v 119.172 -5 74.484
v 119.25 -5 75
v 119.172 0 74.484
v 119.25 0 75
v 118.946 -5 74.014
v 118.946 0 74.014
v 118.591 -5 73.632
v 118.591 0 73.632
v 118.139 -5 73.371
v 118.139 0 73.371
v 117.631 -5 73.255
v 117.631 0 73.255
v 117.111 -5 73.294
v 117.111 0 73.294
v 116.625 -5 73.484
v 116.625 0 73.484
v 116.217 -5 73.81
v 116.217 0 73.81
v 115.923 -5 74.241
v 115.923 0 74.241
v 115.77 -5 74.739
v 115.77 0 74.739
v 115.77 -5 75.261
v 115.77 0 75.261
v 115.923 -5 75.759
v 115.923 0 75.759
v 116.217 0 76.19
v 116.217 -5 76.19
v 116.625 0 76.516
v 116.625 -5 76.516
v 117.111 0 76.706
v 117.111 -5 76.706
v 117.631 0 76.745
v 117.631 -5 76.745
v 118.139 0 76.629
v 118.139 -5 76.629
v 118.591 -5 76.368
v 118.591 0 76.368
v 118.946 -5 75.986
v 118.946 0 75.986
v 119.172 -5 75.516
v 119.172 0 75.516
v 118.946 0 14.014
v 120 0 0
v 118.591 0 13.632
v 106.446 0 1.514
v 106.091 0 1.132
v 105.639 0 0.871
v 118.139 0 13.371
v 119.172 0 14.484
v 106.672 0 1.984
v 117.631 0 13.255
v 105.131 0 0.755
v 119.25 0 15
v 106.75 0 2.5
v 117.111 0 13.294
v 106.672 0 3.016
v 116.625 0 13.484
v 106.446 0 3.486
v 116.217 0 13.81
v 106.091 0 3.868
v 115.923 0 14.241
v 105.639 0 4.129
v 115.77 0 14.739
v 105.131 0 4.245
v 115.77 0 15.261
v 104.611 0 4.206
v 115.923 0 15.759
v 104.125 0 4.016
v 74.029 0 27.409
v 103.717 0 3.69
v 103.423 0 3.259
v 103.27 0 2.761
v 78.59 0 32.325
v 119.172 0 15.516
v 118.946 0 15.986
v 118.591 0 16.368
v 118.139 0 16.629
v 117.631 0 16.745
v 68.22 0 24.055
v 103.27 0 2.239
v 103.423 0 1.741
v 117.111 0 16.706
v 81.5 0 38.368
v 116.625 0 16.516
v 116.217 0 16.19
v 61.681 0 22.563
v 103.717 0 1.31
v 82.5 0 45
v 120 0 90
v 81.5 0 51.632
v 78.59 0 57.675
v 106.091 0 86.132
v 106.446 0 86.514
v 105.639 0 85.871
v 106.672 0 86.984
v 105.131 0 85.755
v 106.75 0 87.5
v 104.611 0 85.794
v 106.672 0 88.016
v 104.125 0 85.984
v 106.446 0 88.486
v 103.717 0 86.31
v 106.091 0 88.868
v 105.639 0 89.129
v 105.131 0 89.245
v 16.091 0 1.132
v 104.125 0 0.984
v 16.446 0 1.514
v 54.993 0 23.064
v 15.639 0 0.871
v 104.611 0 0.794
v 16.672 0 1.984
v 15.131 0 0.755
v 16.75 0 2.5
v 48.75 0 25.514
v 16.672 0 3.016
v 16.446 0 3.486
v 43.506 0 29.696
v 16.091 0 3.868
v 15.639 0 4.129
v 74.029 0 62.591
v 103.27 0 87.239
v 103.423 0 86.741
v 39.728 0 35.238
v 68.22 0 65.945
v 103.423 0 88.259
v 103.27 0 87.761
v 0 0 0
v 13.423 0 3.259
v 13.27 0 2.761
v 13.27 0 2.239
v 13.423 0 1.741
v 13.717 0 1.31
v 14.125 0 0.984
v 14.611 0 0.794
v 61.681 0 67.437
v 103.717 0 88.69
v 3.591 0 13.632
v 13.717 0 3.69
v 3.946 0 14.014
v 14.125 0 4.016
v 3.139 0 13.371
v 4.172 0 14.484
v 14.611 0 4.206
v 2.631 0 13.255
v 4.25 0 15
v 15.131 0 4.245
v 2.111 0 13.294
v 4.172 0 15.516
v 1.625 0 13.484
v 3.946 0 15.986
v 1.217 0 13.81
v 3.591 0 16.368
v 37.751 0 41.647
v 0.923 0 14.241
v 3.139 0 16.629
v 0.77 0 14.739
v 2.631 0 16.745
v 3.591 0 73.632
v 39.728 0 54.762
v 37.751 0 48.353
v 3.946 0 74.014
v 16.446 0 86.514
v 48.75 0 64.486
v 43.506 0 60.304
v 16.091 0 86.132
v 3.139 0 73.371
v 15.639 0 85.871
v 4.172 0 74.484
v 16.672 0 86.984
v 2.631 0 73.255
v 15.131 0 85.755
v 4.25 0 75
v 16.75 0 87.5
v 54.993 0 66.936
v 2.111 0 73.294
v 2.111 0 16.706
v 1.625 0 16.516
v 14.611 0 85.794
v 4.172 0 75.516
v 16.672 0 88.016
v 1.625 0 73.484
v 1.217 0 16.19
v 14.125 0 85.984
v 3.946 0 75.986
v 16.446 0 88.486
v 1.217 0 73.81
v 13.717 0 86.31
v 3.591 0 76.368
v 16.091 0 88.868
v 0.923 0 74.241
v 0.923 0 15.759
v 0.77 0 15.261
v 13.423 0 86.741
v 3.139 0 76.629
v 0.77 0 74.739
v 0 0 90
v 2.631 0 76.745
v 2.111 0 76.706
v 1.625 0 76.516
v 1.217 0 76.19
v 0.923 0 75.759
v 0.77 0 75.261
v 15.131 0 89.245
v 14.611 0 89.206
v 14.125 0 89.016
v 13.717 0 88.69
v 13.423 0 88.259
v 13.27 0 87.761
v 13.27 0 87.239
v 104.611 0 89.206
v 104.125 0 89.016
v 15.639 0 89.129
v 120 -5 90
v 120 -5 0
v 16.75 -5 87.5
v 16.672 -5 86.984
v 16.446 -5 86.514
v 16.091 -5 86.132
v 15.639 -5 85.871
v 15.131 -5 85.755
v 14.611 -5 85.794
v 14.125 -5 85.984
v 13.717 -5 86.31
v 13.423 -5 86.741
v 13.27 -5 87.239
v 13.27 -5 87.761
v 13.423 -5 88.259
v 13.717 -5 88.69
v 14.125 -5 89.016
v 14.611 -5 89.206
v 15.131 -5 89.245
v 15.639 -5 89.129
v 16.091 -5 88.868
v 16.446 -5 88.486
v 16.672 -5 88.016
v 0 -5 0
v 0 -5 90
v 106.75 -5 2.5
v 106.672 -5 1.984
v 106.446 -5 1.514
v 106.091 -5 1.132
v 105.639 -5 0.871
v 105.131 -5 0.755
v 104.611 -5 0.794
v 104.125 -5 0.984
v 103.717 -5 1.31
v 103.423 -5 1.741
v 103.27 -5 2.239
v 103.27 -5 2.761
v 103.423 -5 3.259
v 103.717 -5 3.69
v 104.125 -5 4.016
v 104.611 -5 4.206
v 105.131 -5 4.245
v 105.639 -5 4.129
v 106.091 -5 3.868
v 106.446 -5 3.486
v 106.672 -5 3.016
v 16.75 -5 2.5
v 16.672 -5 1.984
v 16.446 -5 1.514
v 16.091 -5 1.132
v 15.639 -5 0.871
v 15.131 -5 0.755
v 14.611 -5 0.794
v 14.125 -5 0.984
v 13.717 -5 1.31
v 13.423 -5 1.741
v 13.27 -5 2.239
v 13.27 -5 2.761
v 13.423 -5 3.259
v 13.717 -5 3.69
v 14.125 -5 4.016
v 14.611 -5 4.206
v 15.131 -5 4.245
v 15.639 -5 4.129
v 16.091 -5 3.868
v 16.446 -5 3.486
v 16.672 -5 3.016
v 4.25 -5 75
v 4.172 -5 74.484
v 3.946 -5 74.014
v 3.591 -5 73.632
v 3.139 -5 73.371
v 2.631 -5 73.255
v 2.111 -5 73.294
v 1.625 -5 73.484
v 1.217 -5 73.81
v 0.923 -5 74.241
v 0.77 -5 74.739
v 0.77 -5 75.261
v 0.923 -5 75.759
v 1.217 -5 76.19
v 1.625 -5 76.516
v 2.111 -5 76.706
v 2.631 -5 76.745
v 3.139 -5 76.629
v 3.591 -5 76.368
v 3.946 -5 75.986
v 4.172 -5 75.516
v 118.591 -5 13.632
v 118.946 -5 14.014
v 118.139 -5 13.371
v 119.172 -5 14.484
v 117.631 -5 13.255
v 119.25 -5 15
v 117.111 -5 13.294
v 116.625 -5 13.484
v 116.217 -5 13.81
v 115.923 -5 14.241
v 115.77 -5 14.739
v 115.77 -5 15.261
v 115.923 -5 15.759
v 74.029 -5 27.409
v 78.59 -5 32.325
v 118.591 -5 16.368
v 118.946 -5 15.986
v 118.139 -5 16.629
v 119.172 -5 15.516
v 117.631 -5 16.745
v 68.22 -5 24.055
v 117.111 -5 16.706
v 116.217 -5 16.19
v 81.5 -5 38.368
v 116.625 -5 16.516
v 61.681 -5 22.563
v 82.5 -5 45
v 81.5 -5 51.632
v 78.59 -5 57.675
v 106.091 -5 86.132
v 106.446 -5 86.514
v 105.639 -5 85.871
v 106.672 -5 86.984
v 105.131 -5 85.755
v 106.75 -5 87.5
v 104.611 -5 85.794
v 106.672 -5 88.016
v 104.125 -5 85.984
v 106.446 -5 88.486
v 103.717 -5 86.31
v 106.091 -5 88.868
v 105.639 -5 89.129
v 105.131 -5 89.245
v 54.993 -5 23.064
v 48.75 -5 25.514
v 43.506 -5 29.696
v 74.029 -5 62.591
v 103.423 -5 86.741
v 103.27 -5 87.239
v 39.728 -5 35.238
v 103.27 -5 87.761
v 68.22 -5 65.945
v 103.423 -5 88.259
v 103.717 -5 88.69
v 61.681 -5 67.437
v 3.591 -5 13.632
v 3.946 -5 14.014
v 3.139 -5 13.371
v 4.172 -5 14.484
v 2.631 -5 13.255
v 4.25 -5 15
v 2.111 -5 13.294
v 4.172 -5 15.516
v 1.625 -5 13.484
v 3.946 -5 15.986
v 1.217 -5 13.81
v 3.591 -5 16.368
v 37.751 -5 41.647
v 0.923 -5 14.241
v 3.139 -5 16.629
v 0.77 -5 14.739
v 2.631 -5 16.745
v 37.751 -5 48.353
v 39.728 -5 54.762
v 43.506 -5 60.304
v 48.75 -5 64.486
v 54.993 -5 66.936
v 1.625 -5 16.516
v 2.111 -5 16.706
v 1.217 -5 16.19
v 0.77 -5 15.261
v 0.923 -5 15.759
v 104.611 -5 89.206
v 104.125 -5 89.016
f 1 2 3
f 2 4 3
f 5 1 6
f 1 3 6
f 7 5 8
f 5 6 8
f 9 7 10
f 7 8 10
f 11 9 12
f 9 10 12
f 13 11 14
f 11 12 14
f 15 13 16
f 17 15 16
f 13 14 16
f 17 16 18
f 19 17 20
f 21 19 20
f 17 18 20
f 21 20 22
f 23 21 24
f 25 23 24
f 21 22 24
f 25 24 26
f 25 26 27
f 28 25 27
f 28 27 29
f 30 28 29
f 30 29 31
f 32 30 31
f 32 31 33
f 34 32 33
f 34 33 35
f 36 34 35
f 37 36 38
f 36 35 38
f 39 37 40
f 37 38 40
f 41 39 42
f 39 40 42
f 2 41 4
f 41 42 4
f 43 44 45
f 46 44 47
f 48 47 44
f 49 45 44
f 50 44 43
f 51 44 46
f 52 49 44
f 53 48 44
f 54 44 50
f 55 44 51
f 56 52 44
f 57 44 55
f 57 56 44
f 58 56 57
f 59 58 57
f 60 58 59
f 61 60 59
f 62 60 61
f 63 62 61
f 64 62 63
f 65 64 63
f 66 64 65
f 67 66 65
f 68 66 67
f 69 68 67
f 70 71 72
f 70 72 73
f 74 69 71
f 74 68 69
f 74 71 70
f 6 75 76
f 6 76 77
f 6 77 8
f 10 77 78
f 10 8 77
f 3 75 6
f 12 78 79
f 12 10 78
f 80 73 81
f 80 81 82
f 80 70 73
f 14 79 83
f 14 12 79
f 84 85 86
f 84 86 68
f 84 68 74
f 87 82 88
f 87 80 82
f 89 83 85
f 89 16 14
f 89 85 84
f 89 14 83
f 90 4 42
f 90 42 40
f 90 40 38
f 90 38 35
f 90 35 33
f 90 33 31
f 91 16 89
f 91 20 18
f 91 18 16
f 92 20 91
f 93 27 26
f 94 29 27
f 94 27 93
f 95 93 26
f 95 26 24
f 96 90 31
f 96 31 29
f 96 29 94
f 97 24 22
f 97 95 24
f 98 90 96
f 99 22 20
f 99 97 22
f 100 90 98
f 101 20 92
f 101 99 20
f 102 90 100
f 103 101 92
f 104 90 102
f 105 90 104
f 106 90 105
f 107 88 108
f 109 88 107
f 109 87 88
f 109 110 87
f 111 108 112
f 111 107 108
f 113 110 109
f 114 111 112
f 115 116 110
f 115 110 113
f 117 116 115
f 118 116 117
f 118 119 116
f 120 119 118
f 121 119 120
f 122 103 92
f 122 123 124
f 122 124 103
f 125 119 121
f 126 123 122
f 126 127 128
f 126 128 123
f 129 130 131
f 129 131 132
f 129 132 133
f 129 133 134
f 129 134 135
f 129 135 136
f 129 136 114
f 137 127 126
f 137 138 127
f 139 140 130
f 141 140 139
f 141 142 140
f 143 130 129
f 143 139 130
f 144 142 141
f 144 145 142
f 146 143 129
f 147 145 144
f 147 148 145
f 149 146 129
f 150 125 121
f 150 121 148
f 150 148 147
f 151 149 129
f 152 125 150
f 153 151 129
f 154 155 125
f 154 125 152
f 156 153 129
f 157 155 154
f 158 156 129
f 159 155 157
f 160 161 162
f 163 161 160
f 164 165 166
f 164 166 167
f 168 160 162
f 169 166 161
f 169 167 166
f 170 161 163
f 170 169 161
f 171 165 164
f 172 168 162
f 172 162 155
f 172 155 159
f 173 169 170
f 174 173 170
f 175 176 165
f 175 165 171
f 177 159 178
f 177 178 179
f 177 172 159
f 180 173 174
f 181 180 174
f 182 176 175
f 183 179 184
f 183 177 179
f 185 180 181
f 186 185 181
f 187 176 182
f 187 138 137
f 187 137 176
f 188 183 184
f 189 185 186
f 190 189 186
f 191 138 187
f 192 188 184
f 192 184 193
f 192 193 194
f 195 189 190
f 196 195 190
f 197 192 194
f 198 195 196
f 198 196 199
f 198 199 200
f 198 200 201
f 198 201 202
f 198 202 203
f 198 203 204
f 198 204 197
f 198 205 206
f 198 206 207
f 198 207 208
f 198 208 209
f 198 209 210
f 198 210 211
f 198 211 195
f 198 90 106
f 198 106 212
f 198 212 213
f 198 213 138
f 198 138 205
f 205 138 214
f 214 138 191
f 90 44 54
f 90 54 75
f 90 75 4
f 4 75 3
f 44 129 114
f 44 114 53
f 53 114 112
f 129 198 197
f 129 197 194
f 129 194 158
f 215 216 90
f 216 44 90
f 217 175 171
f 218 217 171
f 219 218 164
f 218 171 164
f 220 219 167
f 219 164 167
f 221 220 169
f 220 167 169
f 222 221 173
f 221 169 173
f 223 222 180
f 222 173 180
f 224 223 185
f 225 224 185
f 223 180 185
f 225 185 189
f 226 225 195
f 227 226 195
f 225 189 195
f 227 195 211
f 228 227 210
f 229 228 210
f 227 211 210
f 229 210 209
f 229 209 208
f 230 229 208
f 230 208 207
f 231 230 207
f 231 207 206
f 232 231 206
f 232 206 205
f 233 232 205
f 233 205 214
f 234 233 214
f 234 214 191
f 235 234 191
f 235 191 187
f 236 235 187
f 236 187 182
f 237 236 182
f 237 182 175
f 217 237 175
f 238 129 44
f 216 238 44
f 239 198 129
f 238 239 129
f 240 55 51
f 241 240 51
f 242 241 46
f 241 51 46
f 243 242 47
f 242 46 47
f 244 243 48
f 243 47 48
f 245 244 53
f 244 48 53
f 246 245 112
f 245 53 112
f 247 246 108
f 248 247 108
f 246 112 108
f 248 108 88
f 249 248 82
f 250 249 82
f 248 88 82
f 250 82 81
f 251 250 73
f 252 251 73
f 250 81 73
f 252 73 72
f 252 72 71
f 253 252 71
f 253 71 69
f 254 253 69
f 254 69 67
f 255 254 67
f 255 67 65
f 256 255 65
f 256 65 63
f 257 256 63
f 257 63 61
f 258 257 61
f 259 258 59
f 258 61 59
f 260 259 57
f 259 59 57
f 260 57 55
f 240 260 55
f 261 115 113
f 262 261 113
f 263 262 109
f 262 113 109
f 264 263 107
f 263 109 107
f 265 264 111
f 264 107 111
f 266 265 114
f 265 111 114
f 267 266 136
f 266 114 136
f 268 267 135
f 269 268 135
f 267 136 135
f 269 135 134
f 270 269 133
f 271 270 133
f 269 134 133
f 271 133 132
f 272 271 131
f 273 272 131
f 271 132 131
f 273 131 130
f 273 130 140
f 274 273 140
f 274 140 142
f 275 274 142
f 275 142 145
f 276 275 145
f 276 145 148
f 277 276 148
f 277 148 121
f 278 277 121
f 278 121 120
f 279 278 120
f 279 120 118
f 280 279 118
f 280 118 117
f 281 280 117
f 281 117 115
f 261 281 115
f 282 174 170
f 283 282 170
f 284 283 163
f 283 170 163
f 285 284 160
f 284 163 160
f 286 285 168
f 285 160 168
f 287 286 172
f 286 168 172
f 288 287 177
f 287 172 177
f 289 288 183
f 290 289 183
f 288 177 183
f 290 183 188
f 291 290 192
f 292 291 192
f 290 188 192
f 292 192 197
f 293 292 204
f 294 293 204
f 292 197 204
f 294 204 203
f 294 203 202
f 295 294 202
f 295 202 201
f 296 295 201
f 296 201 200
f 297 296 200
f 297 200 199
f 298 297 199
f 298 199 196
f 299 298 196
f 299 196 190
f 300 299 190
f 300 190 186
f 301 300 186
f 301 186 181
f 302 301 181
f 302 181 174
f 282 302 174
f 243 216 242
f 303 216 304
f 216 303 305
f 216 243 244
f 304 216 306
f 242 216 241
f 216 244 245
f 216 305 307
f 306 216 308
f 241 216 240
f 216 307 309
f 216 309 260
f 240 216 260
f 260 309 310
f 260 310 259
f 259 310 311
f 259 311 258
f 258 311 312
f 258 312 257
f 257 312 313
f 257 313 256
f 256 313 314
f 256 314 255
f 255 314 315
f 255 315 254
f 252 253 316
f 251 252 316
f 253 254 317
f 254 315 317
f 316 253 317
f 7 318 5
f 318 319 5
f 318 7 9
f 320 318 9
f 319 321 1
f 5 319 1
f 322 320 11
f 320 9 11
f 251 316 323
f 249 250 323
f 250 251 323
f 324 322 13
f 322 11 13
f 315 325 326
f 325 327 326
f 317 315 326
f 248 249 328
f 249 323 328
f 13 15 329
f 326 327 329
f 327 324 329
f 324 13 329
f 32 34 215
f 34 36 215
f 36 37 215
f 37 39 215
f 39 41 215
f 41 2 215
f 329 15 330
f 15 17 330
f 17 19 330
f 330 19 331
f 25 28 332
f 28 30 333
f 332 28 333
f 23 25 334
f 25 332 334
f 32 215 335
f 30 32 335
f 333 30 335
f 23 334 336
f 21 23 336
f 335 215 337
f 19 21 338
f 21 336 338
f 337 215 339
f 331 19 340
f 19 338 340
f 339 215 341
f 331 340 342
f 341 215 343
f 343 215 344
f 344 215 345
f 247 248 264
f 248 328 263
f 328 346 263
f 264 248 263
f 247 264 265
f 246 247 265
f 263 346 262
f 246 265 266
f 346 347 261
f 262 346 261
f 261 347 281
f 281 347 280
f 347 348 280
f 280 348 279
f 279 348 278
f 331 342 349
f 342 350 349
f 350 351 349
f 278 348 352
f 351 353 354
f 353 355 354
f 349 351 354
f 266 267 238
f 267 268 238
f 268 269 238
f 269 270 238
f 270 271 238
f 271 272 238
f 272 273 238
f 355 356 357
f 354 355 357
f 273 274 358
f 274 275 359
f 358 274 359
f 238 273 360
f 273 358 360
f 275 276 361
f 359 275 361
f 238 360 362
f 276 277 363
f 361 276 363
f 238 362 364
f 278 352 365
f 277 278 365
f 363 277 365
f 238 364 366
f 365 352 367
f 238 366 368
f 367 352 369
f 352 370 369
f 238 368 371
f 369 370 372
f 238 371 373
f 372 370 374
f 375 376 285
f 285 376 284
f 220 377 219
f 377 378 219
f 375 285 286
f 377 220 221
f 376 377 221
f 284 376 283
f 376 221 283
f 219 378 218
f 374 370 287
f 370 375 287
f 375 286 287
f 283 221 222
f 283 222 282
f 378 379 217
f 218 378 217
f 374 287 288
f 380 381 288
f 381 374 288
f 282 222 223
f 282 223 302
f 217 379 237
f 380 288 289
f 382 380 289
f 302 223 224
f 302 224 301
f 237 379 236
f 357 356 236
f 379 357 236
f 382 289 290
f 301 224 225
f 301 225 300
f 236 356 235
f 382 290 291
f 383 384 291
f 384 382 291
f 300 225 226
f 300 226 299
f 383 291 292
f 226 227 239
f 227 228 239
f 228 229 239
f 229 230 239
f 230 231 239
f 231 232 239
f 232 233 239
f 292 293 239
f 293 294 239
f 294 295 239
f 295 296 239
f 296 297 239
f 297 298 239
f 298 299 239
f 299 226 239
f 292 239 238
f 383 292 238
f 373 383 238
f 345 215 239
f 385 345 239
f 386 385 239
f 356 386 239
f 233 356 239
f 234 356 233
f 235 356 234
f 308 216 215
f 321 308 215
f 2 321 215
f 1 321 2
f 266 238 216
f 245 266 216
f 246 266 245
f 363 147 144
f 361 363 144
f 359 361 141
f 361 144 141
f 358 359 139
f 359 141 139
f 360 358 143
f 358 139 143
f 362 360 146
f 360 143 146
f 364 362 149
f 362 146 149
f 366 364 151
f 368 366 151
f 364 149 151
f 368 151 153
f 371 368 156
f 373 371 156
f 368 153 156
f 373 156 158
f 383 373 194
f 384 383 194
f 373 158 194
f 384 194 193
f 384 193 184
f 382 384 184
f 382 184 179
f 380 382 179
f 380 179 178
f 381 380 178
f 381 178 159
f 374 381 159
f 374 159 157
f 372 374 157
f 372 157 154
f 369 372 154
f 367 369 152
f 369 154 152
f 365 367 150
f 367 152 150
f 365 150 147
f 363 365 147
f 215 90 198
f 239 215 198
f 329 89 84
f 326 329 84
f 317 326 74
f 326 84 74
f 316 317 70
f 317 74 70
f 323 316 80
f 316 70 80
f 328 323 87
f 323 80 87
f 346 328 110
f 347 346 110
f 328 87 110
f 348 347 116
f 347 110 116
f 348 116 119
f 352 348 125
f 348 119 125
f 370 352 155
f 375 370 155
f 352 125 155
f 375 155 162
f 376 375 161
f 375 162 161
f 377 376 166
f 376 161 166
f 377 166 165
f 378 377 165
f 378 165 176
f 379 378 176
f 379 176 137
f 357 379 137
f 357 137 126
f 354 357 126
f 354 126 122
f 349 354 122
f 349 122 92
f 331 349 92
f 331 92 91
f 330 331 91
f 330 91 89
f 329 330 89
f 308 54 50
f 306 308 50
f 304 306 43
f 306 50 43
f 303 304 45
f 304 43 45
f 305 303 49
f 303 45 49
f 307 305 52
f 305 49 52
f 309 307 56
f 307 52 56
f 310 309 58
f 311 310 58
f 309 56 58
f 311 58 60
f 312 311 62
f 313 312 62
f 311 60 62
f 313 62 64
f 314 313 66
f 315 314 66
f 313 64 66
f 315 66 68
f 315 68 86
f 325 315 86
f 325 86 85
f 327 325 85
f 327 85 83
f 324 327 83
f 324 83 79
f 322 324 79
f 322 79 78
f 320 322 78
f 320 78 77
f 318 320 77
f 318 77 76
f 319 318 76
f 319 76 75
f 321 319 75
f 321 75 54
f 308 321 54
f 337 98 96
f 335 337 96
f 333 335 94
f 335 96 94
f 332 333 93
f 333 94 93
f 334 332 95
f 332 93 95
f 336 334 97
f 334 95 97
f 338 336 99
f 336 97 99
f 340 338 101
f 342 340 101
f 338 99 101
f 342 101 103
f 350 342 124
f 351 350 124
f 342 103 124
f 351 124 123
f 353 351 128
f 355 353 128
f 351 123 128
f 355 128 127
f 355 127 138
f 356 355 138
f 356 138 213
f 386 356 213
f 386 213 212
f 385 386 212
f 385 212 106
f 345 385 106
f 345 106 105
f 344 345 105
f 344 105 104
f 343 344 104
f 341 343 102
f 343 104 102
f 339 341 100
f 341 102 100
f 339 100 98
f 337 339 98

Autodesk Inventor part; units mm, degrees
ref_plane "YZ Plane" through (0, 0, 0) normal (1, 0, 0) x (0, 1, 0)
ref_plane "XZ Plane" through (0, 0, 0) normal (0, 1, 0) x (-1, 0, 0)
ref_plane "XY Plane" through (0, 0, 0) normal (0, 0, 1) x (1, 0, 0)
sketch "Sketch1" plane through (0, 0, 0) normal (0, 1, 0) x (-1, 0, 0)
  line L0 (0, 0) -> (-120, 0)
  line L1 (-120, 0) -> (-120, 90)
  line L2 (-120, 90) -> (0, 90)
  line L3 (0, 90) -> (0, 0)
  line L4 (0, 0) -> (-60, 0)
  line L5 (-60, 0) -> (-60, 45)
  line L6 (-60, 45) -> (0, 45)
  line L7 (0, 45) -> (0, 0)
  circle A0 centre (-60, 45) radius 22.5
  dimension "d0" = 120
  dimension "d1" = 90
  dimension "d2" = 60
  dimension "d3" = 45
  dimension "d4" = 45
extrude "Extrusion1" add sketch "Sketch1" against normal blind 5
sketch "Sketch2" plane through (0, 0, 0) normal (0, 1, 0) x (1, 0, 0)
  line L0 (0, -90) -> (0, 0) projected
  line L1 (0, 0) -> (60, 0)
  line L2 (60, 0) -> (60, -45)
  line L3 (60, -45) -> (0, -45)
  line L4 (0, -45) -> (0, 0)
  circle A0 centre (60, -45) radius 22.5
  dimension "d7" = 60
  dimension "d8" = 45
  dimension "d9" = 45
extrude "Extrusion2" cut sketch "Sketch2" against normal blind 5 contours A0 L2 L3 | L3 L2 A0
sketch "Sketch3" plane through (0, 0, 0) normal (0, 1, 0) x (1, 0, 0)
  line L0 (0, 0) -> (120, 0) projected
  line L1 (0, 0) -> (15, 0)
  line L2 (15, 0) -> (15, -2.5)
  line L3 (15, -2.5) -> (0, -2.5)
  line L4 (0, -2.5) -> (0, 0)
  circle A0 centre (15, -2.5) radius 1.75
  dimension "d12" = 15
  dimension "d13" = 2.5
  dimension "d14" = 3.5
extrude "Extrusion3" cut sketch "Sketch3" against normal blind 5 contours A0 L3 L2 | L2 L3 A0
sketch "Sketch4" plane through (0, 0, 0) normal (0, 1, 0) x (1, 0, 0)
  line L0 (120, -90) -> (0, -90) projected
  line L1 (0, -90) -> (15, -90)
  line L2 (15, -90) -> (15, -87.5)
  line L3 (15, -87.5) -> (0, -87.5)
  line L4 (0, -87.5) -> (0, -90)
  circle A0 centre (15, -87.5) radius 1.75
  point P0 (0, 0)
  dimension "d17" = 15
  dimension "d18" = 2.5
  dimension "d19" = 3.5
extrude "Extrusion4" cut sketch "Sketch4" against normal blind 5 contours A0 L3 L2 | L2 L3 A0
sketch "Sketch5" plane through (0, 0, 0) normal (0, 1, 0) x (1, 0, 0)
  line L0 (120, 0) -> (120, -90) projected
  line L1 (120, 0) -> (105, 0)
  line L2 (105, 0) -> (105, -2.5)
  line L3 (105, -2.5) -> (120, -2.5)
  line L4 (120, -2.5) -> (120, 0)
  circle A0 centre (105, -2.5) radius 1.75
  point P0 (0, 0)
  dimension "d22" = 15
  dimension "d23" = 2.5
  dimension "d32" = 3.5
extrude "Extrusion5" [suppressed]
sketch "Sketch6" plane through (0, 0, 0) normal (0, 1, 0) x (1, 0, 0)
  line L0 (120, 0) -> (120, -90) projected
  line L1 (120, -90) -> (105, -90)
  line L2 (105, -90) -> (105, -87.5)
  line L3 (105, -87.5) -> (120, -87.5)
  line L4 (120, -87.5) -> (120, -90)
  circle A0 centre (105, -87.5) radius 1.75
  point P0 (0, 0)
  dimension "d27" = 15
  dimension "d28" = 2.5
  dimension "d29" = 3.5
extrude "Extrusion6" cut sketch "Sketch6" against normal blind 5 contours A0 L2 L3 | L3 L2 A0
sketch "Sketch7" plane through (0, 0, 0) normal (0, 1, 0) x (1, 0, 0)
  line L0 (0, 0) -> (120, 0) projected
  line L1 (120, 0) -> (105, 0)
  line L2 (105, 0) -> (105, -2.5)
  line L3 (105, -2.5) -> (120, -2.5)
  line L4 (120, -2.5) -> (120, 0)
  circle A0 centre (105, -2.5) radius 1.75
  dimension "d33" = 15
  dimension "d34" = 2.5
  dimension "d35" = 3.5
extrude "Extrusion7" cut sketch "Sketch7" against normal blind 5 contours A0 L3 L2 | L2 L3 A0
sketch "Sketch8" plane through (0, 0, 0) normal (0, 1, 0) x (1, 0, 0)
  line L0 (0, 0) -> (2.5, 0)
  line L1 (2.5, 0) -> (2.5, -15)
  line L2 (2.5, -15) -> (0, -15)
  line L3 (0, -15) -> (0, 0)
  circle A0 centre (2.5, -15) radius 1.75
  dimension "d38" = 2.5
  dimension "d39" = 15
  dimension "d40" = 3.5
extrude "Extrusion8" cut sketch "Sketch8" against normal blind 10 contours A0 L2 L1 | L1 L2 A0
sketch "Sketch9" plane through (0, 0, 0) normal (0, 1, 0) x (1, 0, 0)
  line L0 (0, -90) -> (2.5, -90)
  line L1 (2.5, -90) -> (2.5, -75)
  line L2 (2.5, -75) -> (0, -75)
  line L3 (0, -75) -> (0, -90)
  circle A0 centre (2.5, -75) radius 1.75
  point P0 (0, 0)
  dimension "d43" = 2.5
  dimension "d44" = 15
  dimension "d45" = 3.5
extrude "Extrusion9" cut sketch "Sketch9" against normal blind 10 contours A0 L2 L1 | L1 L2 A0
sketch "Sketch10" plane through (0, 0, 0) normal (0, 1, 0) x (1, 0, 0)
  line L0 (120, 0) -> (120, -90) projected
  point P0 (0, 0)
sketch "Sketch11" plane through (0, 0, 0) normal (0, 1, 0) x (1, 0, 0)
  line L0 (120, 0) -> (120, -90) projected
  line L1 (120, 0) -> (117.5, 0)
  line L2 (117.5, 0) -> (117.5, -15)
  line L3 (117.5, -15) -> (120, -15)
  line L4 (120, -15) -> (120, 0)
  circle A0 centre (117.5, -15) radius 1.75
  point P0 (0, 0)
  dimension "d50" = 2.5
  dimension "d51" = 15
  dimension "d52" = 3.5
extrude "Extrusion10" cut sketch "Sketch11" against normal blind 10 contours A0 L2 L3 | L3 L2 A0
sketch "Sketch12" plane through (0, 0, 0) normal (0, 1, 0) x (1, 0, 0)
  line L0 (120, -90) -> (0, -90) projected
  line L1 (120, -90) -> (117.5, -90)
  line L2 (117.5, -90) -> (117.5, -75)
  line L3 (117.5, -75) -> (120, -75)
  line L4 (120, -75) -> (120, -90)
  circle A0 centre (117.5, -75) radius 1.75
  point P0 (0, 0)
  dimension "d55" = 2.5
  dimension "d56" = 15
  dimension "d57" = 3.5
extrude "Extrusion11" cut sketch "Sketch12" against normal blind 10 contours A0 L3 L2 | L2 L3 A0
properties part number "expo2"
